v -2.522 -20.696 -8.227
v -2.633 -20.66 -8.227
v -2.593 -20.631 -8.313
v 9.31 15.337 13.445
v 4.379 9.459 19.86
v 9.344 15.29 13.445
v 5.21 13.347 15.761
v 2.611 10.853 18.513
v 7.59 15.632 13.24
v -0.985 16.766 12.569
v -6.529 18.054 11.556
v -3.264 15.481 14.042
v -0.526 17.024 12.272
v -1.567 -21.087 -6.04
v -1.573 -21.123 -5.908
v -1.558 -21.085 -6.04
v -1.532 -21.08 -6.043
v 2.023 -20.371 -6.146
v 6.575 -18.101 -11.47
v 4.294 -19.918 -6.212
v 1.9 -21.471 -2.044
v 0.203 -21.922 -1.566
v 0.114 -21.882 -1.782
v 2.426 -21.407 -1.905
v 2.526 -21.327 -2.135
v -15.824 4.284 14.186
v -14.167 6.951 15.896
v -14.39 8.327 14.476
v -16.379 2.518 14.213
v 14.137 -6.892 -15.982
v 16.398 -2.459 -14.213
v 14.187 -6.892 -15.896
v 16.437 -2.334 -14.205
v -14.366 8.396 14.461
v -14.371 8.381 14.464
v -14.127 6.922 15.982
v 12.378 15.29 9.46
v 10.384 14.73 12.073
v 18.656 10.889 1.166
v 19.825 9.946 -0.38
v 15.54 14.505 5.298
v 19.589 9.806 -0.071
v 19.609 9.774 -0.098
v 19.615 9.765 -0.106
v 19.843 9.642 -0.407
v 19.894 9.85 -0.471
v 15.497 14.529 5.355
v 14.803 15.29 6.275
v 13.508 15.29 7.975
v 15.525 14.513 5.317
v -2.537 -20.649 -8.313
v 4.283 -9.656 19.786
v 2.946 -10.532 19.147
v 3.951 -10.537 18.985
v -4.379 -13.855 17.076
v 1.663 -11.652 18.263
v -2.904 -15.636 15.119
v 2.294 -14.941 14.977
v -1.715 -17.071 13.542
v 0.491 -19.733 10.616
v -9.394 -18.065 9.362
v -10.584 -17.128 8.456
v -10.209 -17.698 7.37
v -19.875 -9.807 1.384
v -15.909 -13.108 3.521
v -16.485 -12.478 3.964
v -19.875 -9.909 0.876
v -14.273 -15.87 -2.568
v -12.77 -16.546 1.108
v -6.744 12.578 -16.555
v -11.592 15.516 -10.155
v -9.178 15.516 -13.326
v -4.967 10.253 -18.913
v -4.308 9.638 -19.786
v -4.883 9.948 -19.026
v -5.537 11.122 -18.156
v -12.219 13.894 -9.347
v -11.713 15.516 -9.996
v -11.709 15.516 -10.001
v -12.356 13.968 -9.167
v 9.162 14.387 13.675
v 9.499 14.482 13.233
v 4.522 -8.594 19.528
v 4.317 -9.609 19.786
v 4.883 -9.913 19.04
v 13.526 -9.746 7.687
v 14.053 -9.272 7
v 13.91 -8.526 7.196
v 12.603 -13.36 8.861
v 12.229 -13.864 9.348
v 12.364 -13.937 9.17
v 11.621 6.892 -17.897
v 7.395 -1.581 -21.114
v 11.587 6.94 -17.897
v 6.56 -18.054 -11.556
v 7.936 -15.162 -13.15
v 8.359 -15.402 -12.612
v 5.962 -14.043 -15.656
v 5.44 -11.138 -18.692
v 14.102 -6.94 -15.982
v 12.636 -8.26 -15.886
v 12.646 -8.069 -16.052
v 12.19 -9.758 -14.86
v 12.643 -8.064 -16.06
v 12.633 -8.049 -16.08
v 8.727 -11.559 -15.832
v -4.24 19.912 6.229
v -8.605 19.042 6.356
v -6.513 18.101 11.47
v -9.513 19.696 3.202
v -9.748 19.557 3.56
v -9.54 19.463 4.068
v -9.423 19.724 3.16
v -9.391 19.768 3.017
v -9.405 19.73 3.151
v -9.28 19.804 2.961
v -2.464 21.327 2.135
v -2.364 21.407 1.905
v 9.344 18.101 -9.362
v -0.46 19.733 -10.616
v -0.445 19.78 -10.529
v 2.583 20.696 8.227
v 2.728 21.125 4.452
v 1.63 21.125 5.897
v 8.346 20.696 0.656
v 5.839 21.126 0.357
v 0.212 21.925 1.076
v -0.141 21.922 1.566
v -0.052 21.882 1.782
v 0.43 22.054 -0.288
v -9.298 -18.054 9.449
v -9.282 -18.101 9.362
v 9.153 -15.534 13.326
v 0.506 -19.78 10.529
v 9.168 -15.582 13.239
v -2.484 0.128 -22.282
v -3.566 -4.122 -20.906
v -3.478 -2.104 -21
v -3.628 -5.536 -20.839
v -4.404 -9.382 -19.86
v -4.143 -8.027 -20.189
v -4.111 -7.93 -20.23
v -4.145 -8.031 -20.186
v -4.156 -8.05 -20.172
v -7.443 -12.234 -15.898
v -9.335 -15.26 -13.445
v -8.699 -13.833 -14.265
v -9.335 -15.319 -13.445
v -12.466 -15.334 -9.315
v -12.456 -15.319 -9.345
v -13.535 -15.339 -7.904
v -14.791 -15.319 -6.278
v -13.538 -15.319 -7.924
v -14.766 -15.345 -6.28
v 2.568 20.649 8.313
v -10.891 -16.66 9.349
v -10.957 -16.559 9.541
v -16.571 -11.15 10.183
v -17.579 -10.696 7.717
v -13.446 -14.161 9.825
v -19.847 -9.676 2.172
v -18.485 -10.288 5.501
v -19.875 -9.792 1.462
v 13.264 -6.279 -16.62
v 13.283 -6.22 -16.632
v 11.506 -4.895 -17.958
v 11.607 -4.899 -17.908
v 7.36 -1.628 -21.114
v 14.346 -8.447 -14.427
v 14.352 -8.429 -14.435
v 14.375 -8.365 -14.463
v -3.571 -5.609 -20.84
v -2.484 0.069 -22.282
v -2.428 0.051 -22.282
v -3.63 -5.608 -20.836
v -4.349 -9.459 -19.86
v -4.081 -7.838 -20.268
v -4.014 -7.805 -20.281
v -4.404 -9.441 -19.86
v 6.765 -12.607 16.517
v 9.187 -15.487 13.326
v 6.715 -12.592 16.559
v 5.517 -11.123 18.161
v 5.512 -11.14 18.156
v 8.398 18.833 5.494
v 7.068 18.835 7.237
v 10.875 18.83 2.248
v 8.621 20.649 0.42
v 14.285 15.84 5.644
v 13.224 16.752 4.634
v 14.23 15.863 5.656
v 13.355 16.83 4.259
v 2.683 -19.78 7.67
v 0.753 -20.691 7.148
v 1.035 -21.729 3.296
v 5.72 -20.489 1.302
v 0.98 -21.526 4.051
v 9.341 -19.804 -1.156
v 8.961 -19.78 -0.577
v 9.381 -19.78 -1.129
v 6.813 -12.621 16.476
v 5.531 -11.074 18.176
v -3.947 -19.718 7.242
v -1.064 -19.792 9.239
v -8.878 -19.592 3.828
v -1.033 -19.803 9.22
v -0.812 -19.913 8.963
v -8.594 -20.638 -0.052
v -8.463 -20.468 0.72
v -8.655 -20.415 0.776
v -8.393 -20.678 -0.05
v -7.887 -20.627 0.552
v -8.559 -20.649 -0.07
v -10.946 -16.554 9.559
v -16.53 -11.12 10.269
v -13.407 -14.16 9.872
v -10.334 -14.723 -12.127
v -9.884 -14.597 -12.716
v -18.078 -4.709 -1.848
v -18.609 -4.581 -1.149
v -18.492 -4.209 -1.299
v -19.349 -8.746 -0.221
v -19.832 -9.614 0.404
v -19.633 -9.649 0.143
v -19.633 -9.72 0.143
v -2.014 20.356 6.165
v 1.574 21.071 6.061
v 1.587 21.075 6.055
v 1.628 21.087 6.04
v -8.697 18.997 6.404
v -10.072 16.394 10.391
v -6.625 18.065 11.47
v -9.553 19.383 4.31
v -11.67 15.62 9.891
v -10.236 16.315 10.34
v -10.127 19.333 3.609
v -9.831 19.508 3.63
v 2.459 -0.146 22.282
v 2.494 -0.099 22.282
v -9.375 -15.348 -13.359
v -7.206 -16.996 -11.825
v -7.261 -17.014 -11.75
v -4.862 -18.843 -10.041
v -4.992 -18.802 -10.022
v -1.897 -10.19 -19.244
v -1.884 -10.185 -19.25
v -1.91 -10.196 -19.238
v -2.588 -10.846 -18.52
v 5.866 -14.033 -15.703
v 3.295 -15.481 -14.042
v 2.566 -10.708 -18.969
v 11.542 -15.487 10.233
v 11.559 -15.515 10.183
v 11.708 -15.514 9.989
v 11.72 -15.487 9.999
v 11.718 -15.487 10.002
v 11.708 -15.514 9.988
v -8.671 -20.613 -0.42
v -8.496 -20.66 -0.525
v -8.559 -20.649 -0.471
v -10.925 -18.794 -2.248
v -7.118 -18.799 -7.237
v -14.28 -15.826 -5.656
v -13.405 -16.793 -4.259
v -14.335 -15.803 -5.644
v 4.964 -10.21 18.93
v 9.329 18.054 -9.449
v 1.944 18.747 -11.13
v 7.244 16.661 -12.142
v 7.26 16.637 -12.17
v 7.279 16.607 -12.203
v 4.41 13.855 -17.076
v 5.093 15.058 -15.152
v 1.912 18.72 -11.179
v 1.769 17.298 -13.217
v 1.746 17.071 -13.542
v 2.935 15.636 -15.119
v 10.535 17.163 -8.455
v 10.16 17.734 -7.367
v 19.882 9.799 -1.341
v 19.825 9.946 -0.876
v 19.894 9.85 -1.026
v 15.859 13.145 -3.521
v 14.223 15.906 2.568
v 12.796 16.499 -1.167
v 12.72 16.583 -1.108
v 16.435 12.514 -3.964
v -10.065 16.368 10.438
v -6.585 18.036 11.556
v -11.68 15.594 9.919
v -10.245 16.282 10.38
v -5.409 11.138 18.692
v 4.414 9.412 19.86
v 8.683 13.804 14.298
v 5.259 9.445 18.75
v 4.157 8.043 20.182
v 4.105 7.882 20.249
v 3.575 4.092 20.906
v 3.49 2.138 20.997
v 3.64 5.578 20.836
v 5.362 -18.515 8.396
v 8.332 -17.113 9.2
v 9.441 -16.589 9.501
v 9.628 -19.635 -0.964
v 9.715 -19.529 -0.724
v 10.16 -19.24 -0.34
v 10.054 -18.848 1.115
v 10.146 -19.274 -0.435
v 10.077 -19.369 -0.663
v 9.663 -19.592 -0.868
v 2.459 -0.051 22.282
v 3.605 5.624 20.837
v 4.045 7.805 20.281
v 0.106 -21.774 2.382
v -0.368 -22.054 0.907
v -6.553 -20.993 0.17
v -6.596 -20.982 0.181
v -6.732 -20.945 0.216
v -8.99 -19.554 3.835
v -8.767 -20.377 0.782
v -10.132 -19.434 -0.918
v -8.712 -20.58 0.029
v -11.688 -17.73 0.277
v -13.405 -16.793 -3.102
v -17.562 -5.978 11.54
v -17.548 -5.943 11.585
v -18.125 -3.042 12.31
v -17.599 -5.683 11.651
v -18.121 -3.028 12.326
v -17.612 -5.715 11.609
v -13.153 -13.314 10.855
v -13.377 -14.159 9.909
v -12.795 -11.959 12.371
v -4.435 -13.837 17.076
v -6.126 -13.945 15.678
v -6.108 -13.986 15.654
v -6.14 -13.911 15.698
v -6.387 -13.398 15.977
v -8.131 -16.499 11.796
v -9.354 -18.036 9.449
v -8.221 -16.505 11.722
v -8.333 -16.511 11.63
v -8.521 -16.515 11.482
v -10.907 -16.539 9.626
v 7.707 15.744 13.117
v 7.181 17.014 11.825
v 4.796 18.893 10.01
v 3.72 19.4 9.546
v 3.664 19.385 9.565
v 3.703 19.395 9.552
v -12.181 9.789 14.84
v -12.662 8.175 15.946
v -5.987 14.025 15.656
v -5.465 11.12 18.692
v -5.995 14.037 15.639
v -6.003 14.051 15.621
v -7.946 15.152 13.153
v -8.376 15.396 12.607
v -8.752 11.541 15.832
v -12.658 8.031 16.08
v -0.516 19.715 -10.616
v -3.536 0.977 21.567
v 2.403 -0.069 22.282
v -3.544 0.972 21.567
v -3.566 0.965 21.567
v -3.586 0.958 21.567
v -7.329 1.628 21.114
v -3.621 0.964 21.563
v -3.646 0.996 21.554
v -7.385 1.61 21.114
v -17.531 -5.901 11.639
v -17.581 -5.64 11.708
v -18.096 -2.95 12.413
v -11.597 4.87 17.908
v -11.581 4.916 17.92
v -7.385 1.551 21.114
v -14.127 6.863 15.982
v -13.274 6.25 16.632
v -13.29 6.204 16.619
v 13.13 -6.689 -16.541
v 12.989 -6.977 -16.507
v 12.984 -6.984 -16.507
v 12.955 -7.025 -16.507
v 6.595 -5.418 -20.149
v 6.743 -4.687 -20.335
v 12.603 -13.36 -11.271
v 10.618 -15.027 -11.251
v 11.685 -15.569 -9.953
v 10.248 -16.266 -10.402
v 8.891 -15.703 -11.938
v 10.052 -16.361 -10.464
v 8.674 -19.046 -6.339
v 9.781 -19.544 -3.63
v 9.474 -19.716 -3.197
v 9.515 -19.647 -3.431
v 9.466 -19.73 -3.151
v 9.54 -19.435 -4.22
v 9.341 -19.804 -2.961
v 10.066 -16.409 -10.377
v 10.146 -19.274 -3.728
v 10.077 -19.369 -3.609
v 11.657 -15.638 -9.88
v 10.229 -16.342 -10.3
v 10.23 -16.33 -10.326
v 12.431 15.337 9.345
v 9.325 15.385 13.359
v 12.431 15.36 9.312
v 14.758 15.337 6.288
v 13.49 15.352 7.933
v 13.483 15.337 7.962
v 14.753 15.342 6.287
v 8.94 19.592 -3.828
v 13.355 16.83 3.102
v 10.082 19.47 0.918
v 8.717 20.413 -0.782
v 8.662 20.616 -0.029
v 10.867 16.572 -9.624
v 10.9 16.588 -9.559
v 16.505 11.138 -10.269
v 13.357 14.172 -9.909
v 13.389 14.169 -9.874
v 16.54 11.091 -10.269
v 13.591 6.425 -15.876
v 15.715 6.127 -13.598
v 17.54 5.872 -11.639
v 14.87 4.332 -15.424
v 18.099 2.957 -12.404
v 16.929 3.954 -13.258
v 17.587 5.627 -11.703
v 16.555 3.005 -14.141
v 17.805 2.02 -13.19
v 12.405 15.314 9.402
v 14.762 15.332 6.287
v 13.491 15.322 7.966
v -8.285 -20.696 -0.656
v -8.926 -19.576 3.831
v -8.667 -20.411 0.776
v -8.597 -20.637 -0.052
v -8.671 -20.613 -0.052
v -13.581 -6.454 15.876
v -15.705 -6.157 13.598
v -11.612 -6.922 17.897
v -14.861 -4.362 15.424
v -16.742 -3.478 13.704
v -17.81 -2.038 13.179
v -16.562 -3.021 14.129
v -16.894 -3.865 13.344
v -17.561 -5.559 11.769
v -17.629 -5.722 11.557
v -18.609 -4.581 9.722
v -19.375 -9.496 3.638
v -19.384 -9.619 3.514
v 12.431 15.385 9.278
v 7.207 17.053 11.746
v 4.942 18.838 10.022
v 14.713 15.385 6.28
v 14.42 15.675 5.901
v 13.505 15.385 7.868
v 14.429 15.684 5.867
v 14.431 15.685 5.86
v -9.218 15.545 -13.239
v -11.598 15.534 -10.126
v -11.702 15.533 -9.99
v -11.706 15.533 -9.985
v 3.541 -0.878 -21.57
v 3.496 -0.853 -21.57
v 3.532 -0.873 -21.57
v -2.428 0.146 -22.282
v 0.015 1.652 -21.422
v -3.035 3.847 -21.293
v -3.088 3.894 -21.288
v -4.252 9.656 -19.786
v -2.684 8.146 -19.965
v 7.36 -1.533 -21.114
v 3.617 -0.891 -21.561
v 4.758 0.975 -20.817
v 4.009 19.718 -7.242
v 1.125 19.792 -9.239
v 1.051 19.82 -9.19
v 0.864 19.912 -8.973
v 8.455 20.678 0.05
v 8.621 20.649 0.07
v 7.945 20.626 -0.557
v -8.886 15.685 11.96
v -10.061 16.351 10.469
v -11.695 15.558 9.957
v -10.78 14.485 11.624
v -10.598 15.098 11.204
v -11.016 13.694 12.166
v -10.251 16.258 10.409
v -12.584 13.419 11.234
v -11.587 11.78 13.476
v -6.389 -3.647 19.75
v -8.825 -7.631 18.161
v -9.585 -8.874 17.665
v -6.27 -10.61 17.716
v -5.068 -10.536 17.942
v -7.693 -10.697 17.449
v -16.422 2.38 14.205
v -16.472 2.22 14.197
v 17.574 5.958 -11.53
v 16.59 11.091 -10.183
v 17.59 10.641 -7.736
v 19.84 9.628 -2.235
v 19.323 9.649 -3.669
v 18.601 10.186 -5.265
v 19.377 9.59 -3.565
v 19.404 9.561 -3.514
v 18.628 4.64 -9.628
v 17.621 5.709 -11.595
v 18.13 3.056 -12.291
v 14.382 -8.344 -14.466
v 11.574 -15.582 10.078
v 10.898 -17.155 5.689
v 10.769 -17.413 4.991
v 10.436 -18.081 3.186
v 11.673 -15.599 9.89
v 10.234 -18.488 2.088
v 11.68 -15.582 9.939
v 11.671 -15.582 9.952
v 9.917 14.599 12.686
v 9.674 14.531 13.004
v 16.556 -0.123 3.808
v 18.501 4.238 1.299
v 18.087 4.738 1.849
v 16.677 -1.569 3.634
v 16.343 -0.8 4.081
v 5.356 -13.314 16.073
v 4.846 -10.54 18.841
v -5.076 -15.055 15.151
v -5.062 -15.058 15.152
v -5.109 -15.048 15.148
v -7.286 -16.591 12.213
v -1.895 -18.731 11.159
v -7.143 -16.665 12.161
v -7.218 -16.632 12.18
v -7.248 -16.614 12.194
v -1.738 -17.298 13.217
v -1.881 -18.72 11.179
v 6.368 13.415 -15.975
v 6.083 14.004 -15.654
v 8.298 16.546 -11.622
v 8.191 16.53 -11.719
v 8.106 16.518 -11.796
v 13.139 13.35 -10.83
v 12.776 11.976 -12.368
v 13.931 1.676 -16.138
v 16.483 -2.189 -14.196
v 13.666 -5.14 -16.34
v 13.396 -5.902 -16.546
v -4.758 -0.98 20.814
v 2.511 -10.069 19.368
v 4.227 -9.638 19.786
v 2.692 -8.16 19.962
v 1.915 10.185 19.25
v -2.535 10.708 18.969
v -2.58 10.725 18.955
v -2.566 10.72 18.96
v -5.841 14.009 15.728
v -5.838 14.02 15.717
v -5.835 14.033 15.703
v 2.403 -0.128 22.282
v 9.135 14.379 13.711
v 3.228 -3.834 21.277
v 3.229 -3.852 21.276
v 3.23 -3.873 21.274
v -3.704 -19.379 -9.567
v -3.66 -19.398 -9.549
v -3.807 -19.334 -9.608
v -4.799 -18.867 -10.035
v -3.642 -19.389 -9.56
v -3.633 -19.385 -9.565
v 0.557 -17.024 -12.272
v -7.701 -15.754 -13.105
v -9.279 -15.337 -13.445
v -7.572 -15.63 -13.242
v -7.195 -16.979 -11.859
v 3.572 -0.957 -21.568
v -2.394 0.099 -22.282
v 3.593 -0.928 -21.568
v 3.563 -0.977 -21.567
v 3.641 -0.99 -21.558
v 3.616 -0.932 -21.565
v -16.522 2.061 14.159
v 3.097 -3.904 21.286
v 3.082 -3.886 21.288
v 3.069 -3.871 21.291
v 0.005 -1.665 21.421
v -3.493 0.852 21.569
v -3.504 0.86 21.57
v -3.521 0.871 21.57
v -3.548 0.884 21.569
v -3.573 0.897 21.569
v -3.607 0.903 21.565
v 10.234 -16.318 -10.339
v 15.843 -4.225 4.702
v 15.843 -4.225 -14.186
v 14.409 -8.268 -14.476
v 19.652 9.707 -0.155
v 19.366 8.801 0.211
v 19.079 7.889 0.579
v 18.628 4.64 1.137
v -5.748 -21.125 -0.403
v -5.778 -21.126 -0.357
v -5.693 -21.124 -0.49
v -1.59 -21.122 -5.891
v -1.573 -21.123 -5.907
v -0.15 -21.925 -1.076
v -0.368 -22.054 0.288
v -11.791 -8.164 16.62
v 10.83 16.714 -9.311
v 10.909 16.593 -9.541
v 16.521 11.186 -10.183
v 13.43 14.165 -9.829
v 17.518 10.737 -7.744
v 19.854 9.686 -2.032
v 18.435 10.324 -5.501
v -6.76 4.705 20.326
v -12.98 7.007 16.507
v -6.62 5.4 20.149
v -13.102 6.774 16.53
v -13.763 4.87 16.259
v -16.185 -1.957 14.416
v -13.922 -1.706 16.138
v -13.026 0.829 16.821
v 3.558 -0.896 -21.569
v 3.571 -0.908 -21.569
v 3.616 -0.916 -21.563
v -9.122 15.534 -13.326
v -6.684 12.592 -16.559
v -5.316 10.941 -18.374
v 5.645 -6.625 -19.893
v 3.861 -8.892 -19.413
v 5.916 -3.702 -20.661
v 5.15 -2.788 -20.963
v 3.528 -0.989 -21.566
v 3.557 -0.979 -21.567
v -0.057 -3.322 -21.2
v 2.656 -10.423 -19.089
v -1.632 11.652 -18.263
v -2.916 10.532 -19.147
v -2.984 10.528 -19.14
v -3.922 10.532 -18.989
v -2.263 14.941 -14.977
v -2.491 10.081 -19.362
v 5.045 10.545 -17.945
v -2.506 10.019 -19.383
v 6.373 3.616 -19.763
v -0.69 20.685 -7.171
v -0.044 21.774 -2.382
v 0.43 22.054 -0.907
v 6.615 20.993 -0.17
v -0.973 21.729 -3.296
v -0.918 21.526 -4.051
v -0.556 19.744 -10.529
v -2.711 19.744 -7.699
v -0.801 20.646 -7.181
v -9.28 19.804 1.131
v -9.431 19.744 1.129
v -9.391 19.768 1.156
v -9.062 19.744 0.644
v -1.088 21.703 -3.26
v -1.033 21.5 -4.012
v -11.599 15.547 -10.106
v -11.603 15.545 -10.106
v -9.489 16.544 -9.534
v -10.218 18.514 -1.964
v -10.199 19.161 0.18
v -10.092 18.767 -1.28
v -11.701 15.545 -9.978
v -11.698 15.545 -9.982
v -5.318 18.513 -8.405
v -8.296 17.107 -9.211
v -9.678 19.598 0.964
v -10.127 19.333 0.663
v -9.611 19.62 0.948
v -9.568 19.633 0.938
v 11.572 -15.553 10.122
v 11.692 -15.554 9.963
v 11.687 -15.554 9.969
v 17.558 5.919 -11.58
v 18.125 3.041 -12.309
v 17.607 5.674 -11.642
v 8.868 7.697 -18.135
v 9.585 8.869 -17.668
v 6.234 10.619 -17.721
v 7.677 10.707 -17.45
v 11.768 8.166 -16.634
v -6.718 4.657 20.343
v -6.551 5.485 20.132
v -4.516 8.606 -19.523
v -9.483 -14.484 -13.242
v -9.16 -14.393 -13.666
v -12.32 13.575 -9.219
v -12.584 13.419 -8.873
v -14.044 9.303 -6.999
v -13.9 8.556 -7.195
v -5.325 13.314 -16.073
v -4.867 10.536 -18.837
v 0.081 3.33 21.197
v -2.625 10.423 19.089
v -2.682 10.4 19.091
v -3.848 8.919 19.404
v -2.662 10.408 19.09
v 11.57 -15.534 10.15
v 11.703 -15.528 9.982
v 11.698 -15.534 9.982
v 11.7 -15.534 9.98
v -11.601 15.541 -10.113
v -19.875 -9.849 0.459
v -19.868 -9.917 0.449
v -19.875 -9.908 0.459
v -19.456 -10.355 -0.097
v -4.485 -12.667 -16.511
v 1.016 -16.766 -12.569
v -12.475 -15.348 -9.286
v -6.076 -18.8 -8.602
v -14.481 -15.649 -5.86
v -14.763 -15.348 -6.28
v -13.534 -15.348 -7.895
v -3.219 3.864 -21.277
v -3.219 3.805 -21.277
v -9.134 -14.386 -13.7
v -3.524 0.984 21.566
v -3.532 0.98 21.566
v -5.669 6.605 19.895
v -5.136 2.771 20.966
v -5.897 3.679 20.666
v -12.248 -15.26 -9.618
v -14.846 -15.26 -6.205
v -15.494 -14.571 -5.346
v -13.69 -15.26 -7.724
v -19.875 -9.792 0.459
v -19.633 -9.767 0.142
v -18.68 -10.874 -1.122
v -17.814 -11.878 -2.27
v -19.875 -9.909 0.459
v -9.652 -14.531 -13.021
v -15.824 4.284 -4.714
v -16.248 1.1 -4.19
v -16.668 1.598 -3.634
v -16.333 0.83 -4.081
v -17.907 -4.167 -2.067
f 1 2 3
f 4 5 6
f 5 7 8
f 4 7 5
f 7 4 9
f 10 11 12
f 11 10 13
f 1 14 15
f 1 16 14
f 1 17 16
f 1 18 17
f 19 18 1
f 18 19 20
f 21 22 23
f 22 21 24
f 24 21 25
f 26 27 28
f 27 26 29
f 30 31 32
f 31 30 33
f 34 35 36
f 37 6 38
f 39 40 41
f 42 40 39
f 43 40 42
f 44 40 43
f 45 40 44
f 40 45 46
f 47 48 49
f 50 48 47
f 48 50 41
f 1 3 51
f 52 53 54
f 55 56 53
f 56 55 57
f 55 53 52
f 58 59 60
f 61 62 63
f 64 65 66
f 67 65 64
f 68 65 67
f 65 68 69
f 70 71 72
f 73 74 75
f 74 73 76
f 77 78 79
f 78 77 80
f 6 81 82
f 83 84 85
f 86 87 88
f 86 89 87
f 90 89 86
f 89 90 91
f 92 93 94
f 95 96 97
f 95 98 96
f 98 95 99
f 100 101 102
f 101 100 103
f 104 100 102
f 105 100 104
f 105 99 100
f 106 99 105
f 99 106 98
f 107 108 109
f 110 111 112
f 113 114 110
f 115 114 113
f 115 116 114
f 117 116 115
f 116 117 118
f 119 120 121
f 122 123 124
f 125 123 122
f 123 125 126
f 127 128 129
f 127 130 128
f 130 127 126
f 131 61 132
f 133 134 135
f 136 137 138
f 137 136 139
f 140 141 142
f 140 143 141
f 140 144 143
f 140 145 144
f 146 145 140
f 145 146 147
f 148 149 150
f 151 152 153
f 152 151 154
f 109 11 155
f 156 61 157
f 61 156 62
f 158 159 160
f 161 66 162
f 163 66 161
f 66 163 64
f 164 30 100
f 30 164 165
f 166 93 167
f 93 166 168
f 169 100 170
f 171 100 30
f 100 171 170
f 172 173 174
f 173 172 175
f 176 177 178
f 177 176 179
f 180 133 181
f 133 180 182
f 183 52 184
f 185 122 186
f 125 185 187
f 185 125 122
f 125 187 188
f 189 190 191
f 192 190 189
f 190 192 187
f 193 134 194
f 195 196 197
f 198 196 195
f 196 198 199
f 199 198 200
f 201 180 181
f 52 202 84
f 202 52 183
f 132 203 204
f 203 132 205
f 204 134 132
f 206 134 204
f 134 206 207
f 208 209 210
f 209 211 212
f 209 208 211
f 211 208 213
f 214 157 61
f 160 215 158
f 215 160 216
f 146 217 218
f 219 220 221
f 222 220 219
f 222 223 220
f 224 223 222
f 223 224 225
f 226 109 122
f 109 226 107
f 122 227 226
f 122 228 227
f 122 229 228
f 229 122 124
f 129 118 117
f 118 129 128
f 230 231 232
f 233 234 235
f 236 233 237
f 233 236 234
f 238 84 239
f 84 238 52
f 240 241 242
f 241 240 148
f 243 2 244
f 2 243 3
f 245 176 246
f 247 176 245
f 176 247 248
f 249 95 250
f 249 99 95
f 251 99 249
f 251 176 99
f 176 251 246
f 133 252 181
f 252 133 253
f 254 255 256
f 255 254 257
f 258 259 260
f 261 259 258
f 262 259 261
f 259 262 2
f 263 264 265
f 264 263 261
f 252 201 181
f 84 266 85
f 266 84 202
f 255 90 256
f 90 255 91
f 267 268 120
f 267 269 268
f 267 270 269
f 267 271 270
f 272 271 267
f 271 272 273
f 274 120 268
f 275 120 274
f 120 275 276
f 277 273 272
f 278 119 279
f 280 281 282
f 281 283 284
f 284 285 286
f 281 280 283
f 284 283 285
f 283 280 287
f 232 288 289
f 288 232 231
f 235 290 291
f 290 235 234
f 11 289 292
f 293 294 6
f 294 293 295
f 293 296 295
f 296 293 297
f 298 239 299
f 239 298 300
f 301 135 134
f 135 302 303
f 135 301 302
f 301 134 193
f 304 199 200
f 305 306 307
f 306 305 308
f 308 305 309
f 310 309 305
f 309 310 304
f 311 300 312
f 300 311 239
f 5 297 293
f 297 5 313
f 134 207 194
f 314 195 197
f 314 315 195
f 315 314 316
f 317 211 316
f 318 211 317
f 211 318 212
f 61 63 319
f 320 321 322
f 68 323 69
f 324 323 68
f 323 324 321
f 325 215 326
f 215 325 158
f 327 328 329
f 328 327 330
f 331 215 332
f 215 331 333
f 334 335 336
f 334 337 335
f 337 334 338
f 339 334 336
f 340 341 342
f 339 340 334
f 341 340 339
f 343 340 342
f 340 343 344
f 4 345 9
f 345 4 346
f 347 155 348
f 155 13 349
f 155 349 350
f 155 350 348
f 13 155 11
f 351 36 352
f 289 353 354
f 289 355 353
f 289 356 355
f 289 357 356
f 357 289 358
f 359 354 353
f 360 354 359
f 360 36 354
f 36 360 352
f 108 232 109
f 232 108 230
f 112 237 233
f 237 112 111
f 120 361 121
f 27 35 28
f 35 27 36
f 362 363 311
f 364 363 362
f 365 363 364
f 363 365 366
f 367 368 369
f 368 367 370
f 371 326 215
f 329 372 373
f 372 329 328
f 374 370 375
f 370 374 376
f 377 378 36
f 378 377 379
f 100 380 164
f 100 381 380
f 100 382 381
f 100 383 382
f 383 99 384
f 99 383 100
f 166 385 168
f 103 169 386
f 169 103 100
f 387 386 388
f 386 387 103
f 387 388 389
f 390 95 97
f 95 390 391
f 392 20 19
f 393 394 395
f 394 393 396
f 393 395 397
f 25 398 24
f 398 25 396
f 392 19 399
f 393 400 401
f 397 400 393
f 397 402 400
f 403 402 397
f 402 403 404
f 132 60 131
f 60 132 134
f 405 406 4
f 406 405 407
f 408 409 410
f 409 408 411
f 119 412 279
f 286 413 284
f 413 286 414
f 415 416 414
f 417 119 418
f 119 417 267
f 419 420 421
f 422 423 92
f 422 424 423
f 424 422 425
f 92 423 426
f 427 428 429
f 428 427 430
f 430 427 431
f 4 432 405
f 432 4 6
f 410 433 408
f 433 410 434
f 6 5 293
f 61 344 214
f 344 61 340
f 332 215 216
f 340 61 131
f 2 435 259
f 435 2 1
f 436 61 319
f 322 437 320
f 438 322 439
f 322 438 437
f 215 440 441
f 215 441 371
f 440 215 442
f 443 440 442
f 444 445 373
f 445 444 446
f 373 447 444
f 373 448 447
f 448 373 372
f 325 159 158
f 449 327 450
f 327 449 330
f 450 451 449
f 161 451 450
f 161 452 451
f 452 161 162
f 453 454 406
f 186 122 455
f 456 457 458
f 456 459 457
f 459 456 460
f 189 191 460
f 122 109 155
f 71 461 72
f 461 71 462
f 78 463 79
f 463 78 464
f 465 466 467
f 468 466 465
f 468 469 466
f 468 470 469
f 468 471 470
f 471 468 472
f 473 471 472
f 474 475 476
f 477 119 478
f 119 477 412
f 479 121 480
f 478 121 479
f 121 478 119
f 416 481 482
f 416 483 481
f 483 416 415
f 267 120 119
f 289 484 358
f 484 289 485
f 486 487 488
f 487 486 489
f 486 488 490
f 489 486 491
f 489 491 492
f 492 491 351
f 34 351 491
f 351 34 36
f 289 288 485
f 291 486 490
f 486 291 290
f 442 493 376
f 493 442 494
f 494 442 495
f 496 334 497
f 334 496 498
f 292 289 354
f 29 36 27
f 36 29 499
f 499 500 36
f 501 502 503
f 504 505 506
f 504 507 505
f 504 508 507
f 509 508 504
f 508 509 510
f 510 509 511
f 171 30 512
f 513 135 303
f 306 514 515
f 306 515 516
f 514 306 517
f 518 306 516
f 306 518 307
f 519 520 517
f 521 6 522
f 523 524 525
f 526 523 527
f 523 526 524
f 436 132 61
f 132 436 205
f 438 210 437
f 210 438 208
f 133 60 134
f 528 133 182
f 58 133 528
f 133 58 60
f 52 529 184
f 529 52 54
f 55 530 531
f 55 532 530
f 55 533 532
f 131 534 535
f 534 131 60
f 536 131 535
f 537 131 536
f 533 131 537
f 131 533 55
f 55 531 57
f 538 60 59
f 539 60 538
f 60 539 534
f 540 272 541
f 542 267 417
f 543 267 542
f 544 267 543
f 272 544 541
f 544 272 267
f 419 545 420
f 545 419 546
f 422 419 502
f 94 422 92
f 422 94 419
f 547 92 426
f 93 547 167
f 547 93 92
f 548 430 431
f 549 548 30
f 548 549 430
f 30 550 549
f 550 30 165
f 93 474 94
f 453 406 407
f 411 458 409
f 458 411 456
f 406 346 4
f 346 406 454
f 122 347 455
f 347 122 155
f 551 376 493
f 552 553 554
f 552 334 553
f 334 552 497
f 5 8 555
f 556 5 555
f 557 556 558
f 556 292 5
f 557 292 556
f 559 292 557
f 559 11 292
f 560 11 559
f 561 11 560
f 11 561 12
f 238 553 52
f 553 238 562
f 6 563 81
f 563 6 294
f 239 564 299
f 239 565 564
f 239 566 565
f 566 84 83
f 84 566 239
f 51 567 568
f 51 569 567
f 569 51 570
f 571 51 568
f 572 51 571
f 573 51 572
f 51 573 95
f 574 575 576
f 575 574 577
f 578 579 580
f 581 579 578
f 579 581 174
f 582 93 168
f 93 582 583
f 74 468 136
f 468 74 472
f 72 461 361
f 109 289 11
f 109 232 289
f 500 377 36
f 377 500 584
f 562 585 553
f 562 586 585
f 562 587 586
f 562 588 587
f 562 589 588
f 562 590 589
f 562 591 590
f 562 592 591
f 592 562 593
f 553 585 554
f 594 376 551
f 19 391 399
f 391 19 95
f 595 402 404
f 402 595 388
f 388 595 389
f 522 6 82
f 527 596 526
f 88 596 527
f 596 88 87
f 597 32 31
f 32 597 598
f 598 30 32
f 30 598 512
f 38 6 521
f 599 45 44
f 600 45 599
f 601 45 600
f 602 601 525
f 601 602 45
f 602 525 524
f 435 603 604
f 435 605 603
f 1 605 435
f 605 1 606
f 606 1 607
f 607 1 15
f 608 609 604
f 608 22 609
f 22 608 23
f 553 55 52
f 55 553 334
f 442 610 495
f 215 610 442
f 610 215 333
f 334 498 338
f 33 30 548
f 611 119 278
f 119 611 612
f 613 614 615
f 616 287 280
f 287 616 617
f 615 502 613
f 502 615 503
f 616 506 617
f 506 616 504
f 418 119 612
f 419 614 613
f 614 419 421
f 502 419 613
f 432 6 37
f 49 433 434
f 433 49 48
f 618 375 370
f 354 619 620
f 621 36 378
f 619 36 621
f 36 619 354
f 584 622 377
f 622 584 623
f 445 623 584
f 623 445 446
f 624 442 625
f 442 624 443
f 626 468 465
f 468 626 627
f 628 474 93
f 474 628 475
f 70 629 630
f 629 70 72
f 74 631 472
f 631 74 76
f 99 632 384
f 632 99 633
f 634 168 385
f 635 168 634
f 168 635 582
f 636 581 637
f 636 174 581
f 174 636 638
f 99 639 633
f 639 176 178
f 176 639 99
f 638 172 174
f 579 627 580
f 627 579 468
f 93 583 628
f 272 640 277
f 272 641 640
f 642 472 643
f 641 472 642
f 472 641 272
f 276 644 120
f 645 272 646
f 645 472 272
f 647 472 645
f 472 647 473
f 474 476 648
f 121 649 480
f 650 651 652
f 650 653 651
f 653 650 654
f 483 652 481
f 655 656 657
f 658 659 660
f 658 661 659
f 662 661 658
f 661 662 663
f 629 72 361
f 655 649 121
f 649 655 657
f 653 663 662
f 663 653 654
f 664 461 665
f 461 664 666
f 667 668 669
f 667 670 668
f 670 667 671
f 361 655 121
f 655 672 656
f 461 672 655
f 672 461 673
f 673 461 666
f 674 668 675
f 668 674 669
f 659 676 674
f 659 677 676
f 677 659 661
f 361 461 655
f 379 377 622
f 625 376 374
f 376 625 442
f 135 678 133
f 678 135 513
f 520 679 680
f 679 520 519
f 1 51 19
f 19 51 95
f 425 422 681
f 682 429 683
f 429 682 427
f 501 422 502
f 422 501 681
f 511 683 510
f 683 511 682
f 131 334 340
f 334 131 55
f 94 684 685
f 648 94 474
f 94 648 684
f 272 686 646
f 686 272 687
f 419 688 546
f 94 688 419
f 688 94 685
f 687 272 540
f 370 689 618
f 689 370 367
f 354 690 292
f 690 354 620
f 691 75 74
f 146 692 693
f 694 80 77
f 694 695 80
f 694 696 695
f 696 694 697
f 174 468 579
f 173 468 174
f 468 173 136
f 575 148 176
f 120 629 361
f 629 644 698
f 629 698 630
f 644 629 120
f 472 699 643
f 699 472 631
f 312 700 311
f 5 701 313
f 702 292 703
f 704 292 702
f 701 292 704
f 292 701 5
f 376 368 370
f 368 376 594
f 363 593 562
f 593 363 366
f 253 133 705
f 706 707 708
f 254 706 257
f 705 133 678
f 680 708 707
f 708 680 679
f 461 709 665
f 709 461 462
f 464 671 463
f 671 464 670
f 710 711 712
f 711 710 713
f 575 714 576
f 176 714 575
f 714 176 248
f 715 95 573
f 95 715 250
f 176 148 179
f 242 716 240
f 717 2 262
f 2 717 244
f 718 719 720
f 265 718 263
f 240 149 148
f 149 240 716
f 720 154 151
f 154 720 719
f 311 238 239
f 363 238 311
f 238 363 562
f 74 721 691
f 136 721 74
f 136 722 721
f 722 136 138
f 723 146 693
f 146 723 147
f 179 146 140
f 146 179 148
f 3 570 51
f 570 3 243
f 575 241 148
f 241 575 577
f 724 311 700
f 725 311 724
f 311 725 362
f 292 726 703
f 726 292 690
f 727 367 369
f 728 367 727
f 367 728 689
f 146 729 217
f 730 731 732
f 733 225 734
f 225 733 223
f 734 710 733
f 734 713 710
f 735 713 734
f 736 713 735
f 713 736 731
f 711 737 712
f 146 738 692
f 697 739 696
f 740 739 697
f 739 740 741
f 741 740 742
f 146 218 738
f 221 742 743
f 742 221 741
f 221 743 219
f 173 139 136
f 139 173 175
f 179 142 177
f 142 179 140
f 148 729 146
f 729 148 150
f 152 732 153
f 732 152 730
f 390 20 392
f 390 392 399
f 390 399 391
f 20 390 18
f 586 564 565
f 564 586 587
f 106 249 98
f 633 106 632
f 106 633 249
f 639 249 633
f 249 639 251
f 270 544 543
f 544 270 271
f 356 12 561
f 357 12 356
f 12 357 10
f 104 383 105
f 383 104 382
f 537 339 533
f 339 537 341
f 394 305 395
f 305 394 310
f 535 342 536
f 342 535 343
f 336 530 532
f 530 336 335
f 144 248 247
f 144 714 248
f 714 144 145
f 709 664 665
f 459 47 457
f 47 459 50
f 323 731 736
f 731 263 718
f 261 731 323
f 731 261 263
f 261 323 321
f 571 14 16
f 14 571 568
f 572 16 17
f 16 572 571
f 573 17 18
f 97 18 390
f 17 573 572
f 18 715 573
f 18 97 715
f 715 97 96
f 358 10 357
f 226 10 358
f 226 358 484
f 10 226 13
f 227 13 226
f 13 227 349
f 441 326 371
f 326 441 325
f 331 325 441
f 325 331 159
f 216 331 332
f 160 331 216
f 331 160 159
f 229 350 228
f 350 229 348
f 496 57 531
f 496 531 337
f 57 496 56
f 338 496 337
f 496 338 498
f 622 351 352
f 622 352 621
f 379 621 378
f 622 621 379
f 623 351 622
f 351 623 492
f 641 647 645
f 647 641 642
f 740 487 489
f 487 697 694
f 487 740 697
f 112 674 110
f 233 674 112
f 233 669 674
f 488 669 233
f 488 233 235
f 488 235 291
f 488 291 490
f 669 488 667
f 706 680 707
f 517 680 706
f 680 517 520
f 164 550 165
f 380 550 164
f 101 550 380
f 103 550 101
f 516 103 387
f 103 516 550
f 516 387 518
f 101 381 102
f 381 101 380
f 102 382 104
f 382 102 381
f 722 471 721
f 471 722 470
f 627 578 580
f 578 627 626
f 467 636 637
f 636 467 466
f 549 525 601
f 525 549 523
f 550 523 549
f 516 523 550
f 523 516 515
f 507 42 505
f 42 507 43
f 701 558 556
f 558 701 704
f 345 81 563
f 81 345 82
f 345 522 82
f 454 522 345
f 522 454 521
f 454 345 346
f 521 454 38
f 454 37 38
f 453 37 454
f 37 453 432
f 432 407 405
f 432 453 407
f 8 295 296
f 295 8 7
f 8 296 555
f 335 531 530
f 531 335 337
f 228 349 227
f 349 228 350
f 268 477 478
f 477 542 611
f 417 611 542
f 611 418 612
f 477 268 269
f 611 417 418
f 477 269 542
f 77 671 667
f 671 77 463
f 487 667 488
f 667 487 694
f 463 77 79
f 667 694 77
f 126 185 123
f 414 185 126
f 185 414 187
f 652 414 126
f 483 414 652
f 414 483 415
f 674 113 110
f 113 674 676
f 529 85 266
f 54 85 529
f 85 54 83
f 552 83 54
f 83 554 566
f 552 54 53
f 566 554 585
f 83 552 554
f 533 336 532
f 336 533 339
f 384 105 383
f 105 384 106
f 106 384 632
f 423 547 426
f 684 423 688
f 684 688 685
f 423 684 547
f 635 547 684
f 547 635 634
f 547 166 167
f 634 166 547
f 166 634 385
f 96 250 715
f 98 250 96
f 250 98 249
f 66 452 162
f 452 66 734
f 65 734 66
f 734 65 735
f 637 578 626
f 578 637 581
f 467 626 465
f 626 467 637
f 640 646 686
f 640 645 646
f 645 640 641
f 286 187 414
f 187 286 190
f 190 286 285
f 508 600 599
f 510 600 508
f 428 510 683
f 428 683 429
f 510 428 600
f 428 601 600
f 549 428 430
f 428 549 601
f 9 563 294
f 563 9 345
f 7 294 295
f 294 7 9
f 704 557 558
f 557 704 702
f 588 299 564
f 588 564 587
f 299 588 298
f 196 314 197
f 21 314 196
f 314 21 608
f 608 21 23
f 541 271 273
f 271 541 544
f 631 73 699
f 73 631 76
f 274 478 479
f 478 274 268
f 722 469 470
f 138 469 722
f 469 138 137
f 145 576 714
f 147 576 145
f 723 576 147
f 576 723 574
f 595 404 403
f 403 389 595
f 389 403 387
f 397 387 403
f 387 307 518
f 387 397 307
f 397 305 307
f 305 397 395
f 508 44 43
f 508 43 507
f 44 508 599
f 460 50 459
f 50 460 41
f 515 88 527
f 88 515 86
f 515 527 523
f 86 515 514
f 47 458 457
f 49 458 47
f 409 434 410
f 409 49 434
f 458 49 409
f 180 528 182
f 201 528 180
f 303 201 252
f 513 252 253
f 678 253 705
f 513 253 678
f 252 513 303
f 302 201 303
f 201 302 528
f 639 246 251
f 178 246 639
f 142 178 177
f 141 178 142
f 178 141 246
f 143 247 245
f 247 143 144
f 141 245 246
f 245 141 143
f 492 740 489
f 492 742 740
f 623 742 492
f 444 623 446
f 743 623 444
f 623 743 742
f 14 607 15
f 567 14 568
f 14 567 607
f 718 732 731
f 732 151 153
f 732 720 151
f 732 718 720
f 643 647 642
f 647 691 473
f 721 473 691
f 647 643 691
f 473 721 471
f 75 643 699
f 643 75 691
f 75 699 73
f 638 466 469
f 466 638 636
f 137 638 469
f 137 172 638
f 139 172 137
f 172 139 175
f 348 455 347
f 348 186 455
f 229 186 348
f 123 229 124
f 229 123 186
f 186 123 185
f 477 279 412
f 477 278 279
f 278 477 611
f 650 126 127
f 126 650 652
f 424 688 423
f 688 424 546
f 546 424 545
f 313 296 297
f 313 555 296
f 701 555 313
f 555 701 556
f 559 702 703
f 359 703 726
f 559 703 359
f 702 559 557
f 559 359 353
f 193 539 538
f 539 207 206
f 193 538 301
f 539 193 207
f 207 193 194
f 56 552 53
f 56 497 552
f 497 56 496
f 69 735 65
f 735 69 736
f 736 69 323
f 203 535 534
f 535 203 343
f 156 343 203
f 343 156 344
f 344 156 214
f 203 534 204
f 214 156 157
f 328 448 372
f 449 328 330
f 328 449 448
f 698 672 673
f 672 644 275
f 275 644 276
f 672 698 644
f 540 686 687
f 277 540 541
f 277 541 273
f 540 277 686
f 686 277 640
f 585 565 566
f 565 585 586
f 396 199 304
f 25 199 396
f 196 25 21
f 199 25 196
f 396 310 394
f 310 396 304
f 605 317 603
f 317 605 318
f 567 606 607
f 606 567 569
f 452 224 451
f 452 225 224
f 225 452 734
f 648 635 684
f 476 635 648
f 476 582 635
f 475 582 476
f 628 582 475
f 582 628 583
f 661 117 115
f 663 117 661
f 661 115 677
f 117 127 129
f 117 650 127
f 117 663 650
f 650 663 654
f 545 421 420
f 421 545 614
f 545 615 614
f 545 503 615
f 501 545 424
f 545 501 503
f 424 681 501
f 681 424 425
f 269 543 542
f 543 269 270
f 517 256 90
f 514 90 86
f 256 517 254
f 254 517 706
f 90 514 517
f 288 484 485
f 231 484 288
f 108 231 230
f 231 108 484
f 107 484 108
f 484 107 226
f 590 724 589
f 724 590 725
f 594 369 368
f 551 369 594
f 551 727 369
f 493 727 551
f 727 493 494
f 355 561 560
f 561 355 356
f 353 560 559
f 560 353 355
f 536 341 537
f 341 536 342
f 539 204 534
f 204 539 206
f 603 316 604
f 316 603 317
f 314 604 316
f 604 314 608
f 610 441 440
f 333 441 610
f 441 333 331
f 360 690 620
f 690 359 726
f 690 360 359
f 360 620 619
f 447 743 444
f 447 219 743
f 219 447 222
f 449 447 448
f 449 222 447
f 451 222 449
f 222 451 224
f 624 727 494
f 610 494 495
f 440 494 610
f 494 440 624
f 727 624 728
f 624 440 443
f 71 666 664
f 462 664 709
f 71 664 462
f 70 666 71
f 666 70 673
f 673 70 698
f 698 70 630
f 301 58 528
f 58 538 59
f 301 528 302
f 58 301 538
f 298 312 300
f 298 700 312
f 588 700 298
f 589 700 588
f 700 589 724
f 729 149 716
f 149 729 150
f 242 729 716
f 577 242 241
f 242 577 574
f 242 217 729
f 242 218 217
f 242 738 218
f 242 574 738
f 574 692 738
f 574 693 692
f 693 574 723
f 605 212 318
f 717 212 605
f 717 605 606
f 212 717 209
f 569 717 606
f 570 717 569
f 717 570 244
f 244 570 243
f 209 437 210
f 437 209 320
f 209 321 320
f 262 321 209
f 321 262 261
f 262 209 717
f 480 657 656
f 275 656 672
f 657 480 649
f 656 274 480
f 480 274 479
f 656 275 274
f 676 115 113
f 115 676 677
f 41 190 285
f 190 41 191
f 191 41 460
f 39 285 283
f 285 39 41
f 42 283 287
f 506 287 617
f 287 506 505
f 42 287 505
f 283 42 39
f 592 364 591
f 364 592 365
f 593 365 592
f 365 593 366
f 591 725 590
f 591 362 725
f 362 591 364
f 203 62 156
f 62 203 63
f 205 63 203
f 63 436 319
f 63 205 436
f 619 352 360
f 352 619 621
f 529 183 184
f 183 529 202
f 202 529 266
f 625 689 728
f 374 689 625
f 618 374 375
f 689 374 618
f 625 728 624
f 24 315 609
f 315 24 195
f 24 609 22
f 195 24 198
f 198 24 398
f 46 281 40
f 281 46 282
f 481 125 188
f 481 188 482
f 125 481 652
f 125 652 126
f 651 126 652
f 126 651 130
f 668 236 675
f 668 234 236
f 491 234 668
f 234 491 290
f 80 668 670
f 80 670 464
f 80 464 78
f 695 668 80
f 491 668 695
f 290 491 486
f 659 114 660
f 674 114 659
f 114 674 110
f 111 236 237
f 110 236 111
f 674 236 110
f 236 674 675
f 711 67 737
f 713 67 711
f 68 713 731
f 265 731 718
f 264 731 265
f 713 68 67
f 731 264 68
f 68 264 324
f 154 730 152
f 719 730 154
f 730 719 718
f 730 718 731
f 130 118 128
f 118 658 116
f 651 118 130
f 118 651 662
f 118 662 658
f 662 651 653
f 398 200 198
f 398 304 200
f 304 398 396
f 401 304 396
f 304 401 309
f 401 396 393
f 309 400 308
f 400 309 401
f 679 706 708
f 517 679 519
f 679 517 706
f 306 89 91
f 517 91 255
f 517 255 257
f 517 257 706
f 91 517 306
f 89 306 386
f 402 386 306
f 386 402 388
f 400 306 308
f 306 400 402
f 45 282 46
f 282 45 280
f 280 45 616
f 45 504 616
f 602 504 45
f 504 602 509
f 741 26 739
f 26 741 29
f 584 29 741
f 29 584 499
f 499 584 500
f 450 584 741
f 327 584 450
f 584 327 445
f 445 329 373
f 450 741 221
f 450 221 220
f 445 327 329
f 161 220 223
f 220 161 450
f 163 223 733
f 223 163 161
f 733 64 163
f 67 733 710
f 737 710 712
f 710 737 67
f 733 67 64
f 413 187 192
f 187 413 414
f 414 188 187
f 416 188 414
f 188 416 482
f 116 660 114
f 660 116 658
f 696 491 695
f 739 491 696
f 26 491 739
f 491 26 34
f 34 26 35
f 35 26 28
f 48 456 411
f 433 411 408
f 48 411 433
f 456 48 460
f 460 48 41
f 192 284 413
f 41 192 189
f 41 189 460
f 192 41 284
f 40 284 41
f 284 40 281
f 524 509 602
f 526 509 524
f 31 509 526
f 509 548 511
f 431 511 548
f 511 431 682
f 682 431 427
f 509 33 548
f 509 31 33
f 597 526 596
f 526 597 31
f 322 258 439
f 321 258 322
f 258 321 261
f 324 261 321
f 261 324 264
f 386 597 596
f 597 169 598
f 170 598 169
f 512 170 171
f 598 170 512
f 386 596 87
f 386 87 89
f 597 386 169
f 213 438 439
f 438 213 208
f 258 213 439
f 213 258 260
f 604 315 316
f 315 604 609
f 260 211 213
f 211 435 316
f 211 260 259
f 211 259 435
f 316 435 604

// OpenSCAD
// Auto-generated OpenSCAD file

    inner_points = 10*[[0.9310411281195976, -1.9708956644454598, -0.48456235421219784], [-0.033699334115551816, 2.1524185182257494, -0.5933185103962525], [-0.03989472684997508, -2.195916826294735, -0.40302069458653744], [-1.0046351890851246, 1.9273973563764744, -0.5117768507705921], [1.0046351890851246, -1.9273973563764744, 0.5117768507705921], [0.03989472684997508, 2.195916826294735, 0.40302069458653744], [0.033699334115551816, -2.1524185182257494, 0.5933185103962525], [-0.9310411281195976, 1.9708956644454598, 0.48456235421219784], [0.4434653698557001, -0.46631153386828283, -2.1382142073749177], [0.21572104012363613, 0.5070709058311078, -2.1638880532059384], [-0.5274704851138725, -0.6913326957175581, -2.0566725477492573], [-0.7552148148459366, 0.2820497439818326, -2.082346393580278], [0.7552148148459366, -0.2820497439818326, 2.082346393580278], [0.5274704851138725, 0.6913326957175581, 2.0566725477492573], [-0.21572104012363613, -0.5070709058311078, 2.1638880532059384], [-0.4434653698557001, 0.46631153386828283, 2.1382142073749177], [-1.9794000073382254, -0.9850428428689444, -0.3126246729896607], [1.9058059463726982, 0.9415445347999587, -0.6837145319931293], [-1.9058059463726982, -0.9415445347999587, 0.6837145319931293], [1.9794000073382254, 0.9850428428689444, 0.3126246729896607], [-0.8589781717453047, -2.055421900397042, 0.1531838416188064], [0.8589781717453047, 2.055421900397042, -0.1531838416188064], [0.16498829102009893, -1.3528633341160017, -1.7687870534721224], [-0.4312541049635078, 1.1954849770692983, -1.83600205447966], [0.4312541049635078, -1.1954849770692983, 1.83600205447966], [-0.16498829102009893, 1.3528633341160017, 1.7687870534721224], [1.6601035855989856, 0.3501270813904757, -1.4517351994968535], [-1.8527753385768673, -0.4640071303681936, -1.1567147034721392], [1.8527753385768673, 0.4640071303681936, 1.1567147034721392], [-1.6601035855989856, -0.3501270813904757, 1.4517351994968535], [1.0576657968809553, -1.4498599519447088, -1.3286523846946763], [0.32066966437787003, 1.7000717910271093, -1.4117346950477099], [-0.5133414173557517, -1.8139518400048271, -1.1967152079212828], [-1.2503375498588372, 1.335979902966991, -1.2797975182743164], [1.2503375498588372, -1.335979902966991, 1.2797975182743164], [0.5133414173557517, 1.8139518400048271, 1.1967152079212828], [-0.32066966437787003, -1.7000717910271093, 1.4117346950477099], [-1.0576657968809553, 1.4498599519447088, 1.3286523846946763], [1.3361428757165568, -0.56330815169699, -1.6980795385974714], [0.9676448094650141, 1.0116577197889192, -1.7396206937739882], [-1.2058001934897236, -1.152421201606384, -1.4846007021984173], [-1.574298259741266, 0.4225446698795252, -1.5261418573749341], [1.574298259741266, -0.4225446698795252, 1.5261418573749341], [1.2058001934897236, 1.152421201606384, 1.4846007021984173], [-0.9676448094650141, -1.0116577197889192, 1.7396206937739882], [-1.3361428757165568, 0.56330815169699, 1.6980795385974714], [-1.332424862251081, -1.6734569141071347, -0.6405106717159389], [1.2133471702387264, 1.6030751731984023, -0.9716000262702639], [-1.2133471702387264, -1.6030751731984023, 0.9716000262702639], [1.332424862251081, 1.6734569141071347, 0.6405106717159389]];

    outer_points = 10*[[-1.5351098190494932, -1.528959426375013, -0.5401748730333669], [0.2552450391175369, 2.060125161586024, 0.8226799293199251], [-0.8609437043177841, -2.060125161586024, -0.026985812856419433], [0.929411153849246, 1.528959426375013, 1.3358689894968725], [-0.929411153849246, -1.528959426375013, -1.3358689894968725], [0.8609437043177841, 2.060125161586024, 0.026985812856419433], [-0.2552450391175369, -2.060125161586024, -0.8226799293199251], [1.5351098190494932, 1.528959426375013, 0.5401748730333669], [-1.8312961423876284, -0.15805110227230856, 1.2678494648208398], [-1.4086506920132147, 0.6892168374833194, 1.589575841638257], [-1.157130027655919, -0.6892168374833194, 1.7810385249977874], [-0.7344845772815055, 0.15805110227230856, 2.1027649018152044], [0.7344845772815055, -0.15805110227230856, -2.1027649018152044], [1.157130027655919, 0.6892168374833194, -1.7810385249977874], [1.4086506920132147, -0.6892168374833194, -1.589575841638257], [1.8312961423876284, 0.15805110227230856, -1.2678494648208398], [0.9137346872778909, -1.5486610507140617, 1.323935741932434], [-1.519433352478138, 1.5486610507140617, -0.5282416254689284], [1.519433352478138, -1.5486610507140617, 0.5282416254689284], [-0.9137346872778909, 1.5486610507140617, -1.323935741932434], [0.11792209889297003, -2.228027076027857, 0.08976471789754577], [-0.11792209889297003, 2.228027076027857, -0.08976471789754577], [-1.6489692559528297, -1.109088131929166, 1.0182788842139632], [-0.542469101682108, 1.109088131929166, 1.8605694737993177], [0.542469101682108, -1.109088131929166, -1.8605694737993177], [1.6489692559528297, 1.109088131929166, -1.0182788842139632], [-2.0124478047987377, 0.960887841826382, 0.11320938958748228], [0.42670811236404715, -0.960887841826382, 1.969944851962293], [-0.42670811236404715, 0.960887841826382, -1.969944851962293], [2.0124478047987377, -0.960887841826382, -0.11320938958748228], [-2.0221363939633368, -0.9411862174873333, 0.10583423699649219], [-0.6544269861707203, 1.8006304307180756, 1.146962662532367], [-0.9313127062639702, -1.8006304307180756, 0.9361915790174082], [0.4363967015286464, 0.9411862174873333, 1.977320004553283], [-0.4363967015286464, -0.9411862174873333, -1.977320004553283], [0.9313127062639702, 1.8006304307180756, -0.9361915790174082], [0.6544269861707203, -1.8006304307180756, -1.146962662532367], [2.0221363939633368, 0.9411862174873333, -0.10583423699649219], [-2.2044632803981354, 0.009850812169524326, 0.35540481760336906], [-1.520608576501827, 1.380759136272229, 0.8759690303713064], [-0.4394734779670596, -1.380759136272229, 1.6989512198012324], [0.2443812259292486, -0.009850812169524326, 2.2195154325691697], [-0.2443812259292486, 0.009850812169524326, -2.2195154325691697], [0.4394734779670596, 1.380759136272229, -1.6989512198012324], [1.520608576501827, -1.380759136272229, -0.8759690303713064], [2.2044632803981354, -0.009850812169524326, -0.35540481760336906], [0.04755309694678411, -1.9685323451599084, 1.0529421097713736], [-1.0275941241812274, 1.9685323451599084, 0.2345180153148959], [1.0275941241812274, -1.9685323451599084, -0.2345180153148959], [-0.04755309694678411, 1.9685323451599084, -1.0529421097713736]];

    // Convex hull for inner set (I)
    module inner_hull() {
        hull() {
            for (p = inner_points) {
                translate(p) sphere(r=0.1);
            }
        }
    }

    // Convex hull for outer set (O) minus inner hull (O \ I)
    module outer_minus_inner() {
        difference() {
            hull() {
                for (p = outer_points) {
                    translate(p) sphere(r=0.1);
                }
            }
            inner_hull(); // Subtract inner hull
        }
    }

    // Convex hull for outer set (O) minus all translated inner hulls
    module outer_minus_AllTranslationInner() {
        difference() {
            hull() {
                for (p = outer_points) {
                    translate(p) sphere(r=0.1);
                }
            }
            hull() {
                translate([0,0,50]) inner_hull();
                translate([0,0,-50]) inner_hull();
            }; // Subtract translated inner hulls
        }
    }

    // Difference between outer_minus_inner and outer_minus_AllTranslationInner
    module outer_minus_inner_diff() {
        difference() {
            // Outer minus inner
            difference() {
                hull() {
                    for (p = outer_points) {
                        translate(p) sphere(r=0.1);
                    }
                }
                inner_hull();
            }

            // Subtract Outer minus AllTranslationInner
            difference() {
                hull() {
                    for (p = outer_points) {
                        translate(p) sphere(r=0.1);
                    }
                }
                hull() {
                    translate([0,0,50]) inner_hull();
                    translate([0,0,-50]) inner_hull();
                };
            }
        }
    }

    // Rendering all with colors applied
    color([1, 1, 0, 1]) outer_minus_inner_diff(); // Opaque yellow
    
